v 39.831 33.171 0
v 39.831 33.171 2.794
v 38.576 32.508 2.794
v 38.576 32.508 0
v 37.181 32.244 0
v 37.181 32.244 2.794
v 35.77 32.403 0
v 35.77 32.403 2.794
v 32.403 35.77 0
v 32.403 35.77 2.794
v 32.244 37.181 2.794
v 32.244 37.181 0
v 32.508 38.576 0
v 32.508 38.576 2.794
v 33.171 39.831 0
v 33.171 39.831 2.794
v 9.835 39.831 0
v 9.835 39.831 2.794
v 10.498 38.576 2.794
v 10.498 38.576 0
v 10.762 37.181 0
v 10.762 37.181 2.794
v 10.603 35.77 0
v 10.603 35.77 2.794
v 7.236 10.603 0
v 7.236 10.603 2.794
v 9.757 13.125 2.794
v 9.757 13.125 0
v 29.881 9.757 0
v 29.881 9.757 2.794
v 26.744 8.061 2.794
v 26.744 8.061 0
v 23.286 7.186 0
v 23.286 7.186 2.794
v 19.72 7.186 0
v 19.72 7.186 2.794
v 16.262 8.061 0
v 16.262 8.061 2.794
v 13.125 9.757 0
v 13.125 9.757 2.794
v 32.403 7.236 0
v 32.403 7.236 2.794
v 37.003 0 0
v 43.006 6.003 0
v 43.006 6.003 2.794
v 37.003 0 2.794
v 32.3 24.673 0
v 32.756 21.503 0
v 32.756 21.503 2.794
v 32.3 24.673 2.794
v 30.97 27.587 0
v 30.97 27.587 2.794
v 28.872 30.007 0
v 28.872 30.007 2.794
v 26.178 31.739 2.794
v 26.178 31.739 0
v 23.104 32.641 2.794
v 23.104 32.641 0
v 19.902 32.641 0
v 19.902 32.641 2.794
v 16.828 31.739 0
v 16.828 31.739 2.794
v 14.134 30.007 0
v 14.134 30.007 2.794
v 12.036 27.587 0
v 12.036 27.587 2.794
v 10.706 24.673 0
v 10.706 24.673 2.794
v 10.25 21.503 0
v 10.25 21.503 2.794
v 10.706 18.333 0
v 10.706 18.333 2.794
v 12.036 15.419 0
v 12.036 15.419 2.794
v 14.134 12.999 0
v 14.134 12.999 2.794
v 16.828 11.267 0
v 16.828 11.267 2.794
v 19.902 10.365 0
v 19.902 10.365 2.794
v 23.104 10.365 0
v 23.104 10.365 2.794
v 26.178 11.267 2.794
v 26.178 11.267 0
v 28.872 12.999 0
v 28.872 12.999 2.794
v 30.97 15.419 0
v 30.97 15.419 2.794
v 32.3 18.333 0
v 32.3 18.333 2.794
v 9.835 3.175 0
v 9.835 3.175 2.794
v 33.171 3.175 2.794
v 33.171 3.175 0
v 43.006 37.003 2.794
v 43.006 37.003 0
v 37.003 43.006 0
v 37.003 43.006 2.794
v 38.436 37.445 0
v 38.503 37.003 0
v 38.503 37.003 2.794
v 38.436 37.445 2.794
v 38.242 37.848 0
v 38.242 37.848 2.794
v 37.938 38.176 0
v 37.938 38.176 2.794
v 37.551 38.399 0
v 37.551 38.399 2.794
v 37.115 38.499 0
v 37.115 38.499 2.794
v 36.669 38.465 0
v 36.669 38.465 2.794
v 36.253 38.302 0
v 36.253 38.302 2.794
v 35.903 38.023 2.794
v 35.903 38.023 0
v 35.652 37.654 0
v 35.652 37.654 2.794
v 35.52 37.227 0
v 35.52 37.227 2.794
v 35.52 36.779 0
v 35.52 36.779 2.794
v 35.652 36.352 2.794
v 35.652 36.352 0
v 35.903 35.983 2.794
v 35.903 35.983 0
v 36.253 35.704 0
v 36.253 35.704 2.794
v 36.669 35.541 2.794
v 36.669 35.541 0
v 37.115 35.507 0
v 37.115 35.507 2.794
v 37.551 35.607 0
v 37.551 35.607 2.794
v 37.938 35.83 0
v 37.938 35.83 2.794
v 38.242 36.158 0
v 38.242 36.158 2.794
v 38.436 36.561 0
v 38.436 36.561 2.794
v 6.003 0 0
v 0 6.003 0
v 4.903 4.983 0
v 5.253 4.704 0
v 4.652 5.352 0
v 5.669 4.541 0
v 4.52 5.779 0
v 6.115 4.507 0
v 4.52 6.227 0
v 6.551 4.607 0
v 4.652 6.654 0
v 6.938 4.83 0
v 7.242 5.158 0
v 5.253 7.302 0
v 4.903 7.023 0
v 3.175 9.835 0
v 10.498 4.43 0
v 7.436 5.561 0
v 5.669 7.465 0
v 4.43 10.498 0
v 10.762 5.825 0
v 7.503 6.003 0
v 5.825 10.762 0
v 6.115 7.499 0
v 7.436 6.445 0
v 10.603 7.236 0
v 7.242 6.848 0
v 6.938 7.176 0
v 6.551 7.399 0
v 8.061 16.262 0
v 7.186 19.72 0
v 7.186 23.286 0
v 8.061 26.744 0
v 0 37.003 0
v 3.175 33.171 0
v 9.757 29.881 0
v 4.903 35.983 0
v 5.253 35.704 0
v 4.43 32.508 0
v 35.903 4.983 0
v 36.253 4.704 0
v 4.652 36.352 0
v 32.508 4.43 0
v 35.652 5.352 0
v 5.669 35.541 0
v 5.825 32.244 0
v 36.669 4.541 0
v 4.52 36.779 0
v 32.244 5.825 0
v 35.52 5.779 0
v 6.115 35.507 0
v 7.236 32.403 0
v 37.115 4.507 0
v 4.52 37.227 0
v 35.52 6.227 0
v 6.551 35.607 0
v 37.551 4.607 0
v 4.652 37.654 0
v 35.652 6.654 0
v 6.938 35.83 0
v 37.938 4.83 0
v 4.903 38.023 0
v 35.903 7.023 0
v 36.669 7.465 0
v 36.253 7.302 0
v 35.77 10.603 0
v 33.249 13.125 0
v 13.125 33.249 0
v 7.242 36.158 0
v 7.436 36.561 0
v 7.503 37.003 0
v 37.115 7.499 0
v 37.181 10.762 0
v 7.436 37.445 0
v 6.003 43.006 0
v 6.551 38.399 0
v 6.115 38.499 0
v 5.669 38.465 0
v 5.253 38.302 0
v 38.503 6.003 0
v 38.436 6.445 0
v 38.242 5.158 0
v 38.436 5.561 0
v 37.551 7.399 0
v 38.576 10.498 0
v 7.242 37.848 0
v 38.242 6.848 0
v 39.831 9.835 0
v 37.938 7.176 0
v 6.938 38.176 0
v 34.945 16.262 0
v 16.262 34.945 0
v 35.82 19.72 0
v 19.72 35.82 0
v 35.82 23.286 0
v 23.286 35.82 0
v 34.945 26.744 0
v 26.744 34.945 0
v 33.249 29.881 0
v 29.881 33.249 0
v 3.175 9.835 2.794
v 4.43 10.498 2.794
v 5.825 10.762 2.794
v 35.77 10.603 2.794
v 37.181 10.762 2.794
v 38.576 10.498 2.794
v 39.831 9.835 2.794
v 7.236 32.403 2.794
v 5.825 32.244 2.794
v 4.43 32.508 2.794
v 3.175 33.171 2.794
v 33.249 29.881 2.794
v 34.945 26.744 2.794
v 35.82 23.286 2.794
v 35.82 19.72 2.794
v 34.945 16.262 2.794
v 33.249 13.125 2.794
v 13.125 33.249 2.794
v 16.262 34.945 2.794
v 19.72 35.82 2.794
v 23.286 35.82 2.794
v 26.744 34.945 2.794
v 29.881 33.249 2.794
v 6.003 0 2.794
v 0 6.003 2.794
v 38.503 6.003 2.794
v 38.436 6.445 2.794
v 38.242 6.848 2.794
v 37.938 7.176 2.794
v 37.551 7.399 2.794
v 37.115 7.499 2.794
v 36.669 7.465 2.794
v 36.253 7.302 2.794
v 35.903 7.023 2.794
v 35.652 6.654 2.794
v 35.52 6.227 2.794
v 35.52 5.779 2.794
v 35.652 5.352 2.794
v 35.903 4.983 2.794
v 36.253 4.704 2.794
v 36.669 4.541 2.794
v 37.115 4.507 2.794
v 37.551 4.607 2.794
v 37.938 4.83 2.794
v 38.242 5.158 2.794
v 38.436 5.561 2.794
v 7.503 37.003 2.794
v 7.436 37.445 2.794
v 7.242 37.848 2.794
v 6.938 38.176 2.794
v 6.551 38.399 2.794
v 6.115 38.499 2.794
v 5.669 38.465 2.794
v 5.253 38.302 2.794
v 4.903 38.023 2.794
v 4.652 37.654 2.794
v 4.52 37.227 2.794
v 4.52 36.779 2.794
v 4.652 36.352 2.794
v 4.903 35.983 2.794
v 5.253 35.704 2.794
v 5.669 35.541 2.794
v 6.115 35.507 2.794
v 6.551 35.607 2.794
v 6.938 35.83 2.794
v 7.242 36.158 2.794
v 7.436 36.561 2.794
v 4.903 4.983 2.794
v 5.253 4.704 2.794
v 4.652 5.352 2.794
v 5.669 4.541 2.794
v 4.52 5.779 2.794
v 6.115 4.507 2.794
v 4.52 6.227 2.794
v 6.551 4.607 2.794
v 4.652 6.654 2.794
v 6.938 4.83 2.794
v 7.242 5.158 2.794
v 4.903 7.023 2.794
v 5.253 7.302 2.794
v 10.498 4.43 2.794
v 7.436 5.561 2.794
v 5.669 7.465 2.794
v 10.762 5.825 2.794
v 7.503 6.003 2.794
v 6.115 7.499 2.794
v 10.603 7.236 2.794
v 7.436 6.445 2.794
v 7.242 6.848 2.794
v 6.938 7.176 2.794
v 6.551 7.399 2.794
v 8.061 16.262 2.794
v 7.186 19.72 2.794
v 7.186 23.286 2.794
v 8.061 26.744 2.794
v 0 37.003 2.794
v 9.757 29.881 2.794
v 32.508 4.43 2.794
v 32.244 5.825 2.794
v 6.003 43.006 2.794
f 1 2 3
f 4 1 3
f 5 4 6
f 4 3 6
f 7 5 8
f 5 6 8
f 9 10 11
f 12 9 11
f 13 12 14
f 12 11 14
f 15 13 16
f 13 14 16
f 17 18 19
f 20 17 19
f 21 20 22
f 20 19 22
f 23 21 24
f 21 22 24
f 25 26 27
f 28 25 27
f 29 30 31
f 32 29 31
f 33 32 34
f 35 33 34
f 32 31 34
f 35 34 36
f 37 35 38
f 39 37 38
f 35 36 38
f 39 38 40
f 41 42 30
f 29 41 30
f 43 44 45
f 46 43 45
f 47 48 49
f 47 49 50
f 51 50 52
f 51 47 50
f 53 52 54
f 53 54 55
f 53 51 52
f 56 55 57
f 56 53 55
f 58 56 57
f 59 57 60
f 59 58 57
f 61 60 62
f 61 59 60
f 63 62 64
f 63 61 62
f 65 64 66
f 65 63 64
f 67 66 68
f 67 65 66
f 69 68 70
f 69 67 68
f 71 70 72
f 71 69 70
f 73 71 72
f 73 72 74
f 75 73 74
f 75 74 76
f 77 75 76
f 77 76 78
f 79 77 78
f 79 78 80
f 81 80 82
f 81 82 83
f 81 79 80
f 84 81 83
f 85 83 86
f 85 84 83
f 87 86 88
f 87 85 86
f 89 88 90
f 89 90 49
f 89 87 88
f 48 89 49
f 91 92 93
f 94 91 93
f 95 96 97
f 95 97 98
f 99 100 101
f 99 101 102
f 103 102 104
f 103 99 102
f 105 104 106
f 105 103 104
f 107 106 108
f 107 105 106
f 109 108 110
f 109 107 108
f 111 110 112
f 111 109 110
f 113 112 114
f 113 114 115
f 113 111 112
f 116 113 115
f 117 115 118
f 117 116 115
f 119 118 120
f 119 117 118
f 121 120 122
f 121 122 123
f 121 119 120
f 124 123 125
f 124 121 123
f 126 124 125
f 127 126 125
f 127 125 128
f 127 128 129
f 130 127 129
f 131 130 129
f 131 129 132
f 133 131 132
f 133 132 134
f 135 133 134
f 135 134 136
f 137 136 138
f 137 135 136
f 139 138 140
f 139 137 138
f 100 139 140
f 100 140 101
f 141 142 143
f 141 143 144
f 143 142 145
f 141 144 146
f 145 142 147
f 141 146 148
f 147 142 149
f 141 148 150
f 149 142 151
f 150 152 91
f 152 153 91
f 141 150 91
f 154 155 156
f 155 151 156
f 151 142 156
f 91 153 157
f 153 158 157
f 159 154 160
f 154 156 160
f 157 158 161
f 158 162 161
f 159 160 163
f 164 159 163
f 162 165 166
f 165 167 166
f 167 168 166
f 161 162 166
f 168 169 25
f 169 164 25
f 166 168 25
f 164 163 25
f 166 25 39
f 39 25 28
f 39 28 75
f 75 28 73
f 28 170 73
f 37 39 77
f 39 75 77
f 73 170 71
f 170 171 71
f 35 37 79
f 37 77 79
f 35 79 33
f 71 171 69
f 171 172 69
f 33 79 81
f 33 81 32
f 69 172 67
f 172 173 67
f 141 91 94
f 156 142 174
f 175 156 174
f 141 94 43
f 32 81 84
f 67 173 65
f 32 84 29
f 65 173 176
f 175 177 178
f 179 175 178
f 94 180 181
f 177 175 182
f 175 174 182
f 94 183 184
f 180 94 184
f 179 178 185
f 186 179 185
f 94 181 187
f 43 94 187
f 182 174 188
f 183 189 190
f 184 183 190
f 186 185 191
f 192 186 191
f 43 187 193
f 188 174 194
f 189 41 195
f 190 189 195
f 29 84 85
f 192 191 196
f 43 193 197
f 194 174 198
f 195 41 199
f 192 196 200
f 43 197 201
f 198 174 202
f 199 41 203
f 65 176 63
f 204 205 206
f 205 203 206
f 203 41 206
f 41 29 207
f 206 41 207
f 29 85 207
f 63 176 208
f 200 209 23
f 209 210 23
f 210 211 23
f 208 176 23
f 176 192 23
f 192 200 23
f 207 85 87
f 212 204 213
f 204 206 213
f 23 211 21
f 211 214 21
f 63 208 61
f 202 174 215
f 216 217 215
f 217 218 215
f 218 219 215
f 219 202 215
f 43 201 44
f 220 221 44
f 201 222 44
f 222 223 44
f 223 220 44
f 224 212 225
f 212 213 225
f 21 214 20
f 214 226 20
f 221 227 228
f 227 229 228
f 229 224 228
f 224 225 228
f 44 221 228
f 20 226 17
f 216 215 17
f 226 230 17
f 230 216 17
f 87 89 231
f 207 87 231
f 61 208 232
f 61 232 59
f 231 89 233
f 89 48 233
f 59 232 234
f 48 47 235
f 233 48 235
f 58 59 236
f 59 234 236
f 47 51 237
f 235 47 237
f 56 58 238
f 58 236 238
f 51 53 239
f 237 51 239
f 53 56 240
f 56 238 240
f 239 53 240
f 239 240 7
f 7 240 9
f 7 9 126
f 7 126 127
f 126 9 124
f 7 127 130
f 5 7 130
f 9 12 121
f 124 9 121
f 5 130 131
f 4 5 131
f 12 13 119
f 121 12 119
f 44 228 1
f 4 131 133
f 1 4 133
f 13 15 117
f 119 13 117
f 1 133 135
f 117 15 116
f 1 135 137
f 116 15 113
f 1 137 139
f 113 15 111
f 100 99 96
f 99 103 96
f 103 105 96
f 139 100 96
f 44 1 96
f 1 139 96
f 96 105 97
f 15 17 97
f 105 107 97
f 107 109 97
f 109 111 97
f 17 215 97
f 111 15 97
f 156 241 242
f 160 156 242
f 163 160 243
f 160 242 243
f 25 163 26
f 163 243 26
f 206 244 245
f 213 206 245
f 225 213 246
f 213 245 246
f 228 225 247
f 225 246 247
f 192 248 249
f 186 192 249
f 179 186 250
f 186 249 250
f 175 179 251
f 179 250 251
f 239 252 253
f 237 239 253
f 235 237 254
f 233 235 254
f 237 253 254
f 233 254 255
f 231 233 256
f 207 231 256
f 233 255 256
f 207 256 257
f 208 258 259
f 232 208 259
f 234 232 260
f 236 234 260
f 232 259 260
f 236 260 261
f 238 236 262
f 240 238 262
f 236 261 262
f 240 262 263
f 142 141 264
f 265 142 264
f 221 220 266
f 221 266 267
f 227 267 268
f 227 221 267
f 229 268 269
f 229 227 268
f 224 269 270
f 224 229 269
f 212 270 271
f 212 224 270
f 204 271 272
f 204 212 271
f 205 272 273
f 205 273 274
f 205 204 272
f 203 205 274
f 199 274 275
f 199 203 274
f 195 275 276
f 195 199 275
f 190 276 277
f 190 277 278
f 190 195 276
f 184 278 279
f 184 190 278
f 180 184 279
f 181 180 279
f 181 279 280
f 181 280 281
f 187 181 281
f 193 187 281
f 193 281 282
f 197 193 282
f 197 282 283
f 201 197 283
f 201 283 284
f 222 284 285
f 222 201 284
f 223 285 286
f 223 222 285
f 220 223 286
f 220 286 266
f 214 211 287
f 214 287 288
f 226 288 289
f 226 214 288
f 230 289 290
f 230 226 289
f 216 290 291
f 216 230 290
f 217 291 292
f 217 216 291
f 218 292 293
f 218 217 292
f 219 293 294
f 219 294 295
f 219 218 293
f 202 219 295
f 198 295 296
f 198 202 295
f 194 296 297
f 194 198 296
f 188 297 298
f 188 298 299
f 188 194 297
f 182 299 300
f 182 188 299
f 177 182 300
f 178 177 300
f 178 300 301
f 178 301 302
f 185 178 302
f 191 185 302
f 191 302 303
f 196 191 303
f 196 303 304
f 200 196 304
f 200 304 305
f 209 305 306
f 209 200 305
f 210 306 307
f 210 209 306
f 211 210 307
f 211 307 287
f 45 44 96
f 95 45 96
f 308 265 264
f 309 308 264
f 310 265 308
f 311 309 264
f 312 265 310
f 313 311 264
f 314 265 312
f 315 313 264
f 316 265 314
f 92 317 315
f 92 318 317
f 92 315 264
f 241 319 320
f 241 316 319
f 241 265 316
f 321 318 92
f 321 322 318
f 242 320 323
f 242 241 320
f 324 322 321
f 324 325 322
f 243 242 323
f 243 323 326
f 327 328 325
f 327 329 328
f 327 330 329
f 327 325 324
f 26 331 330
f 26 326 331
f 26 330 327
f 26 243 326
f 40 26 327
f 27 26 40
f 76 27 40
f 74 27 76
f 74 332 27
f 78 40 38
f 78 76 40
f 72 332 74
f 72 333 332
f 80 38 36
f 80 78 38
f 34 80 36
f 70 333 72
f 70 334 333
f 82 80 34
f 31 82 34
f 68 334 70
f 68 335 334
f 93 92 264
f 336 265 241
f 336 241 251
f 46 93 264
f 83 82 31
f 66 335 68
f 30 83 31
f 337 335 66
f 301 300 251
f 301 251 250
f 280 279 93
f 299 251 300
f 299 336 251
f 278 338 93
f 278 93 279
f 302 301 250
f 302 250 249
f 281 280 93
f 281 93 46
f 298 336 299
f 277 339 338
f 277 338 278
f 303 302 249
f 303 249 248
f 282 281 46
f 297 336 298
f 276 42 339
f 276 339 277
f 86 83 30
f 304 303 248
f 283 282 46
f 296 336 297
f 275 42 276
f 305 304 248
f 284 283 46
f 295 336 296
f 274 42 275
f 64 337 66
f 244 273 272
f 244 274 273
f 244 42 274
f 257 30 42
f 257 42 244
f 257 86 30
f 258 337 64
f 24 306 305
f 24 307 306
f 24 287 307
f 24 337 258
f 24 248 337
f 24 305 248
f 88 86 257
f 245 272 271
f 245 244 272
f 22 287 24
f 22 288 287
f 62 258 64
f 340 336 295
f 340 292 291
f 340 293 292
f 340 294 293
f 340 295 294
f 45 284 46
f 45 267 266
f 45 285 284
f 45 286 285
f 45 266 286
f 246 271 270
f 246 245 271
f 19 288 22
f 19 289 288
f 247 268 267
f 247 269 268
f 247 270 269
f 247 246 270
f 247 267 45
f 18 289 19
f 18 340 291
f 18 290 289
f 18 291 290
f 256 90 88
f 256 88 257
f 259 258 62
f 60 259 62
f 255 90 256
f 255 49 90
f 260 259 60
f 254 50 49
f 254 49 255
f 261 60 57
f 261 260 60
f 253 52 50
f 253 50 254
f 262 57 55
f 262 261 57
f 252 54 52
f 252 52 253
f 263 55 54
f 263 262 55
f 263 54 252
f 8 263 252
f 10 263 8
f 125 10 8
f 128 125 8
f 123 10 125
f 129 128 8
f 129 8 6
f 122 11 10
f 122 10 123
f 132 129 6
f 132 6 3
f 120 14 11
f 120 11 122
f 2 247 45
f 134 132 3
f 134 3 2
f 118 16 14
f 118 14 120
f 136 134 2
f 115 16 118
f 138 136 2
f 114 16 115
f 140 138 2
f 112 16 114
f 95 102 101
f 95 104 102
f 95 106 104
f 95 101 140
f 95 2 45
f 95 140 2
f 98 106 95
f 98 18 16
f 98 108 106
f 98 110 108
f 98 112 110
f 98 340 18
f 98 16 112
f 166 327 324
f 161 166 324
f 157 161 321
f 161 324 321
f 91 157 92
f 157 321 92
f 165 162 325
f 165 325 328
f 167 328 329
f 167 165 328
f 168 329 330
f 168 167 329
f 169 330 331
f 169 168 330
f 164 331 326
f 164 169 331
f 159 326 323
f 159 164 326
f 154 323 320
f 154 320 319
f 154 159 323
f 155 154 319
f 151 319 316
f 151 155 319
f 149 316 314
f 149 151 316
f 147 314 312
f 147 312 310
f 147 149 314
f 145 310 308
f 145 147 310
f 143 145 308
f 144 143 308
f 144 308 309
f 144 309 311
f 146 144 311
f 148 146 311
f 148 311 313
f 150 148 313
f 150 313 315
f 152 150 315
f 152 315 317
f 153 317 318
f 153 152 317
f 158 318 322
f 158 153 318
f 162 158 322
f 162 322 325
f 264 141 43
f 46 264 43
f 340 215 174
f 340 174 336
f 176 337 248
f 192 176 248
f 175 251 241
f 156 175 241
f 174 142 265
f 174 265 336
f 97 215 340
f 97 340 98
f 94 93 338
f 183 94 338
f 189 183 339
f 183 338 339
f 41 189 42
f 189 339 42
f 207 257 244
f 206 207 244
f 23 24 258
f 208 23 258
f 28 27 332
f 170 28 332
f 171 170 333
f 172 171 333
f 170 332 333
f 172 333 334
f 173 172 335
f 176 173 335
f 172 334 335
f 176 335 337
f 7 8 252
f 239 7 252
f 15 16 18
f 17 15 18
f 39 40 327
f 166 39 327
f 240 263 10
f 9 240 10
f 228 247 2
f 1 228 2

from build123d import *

# Parameters (mm, degrees)
F0_W            = 43.0059846
F0_H            = 43.0059846
F0_R            = 1.5
F0_R_2          = 11.2530001
F1_DEPTH        = 2.79375108
F2_SIZE         = 6.0030106
F4_DEPTH        = 2.79375108
F4_COPIES_COUNT = 4


# Not quite as in the source:
# - a pattern or mirror of a feature is missing from the dataset's text; its kind, count and spacing are read off the source's solid


with BuildPart() as f1:
    # F0 (on Top) → F1 (new body)
    with BuildSketch(Plane.XY):
        with Locations((21.5029923, 21.5029923)):
            Rectangle(F0_W, F0_H)
        with Locations((6.0029979, 6.0029979)):
            Circle(F0_R, mode=Mode.SUBTRACT)
        with Locations((21.5029923, 21.5029923)):
            Circle(F0_R_2, mode=Mode.SUBTRACT)
        with Locations((37.0029867, 6.0029979)):
            Circle(F0_R, mode=Mode.SUBTRACT)
        with Locations((6.0029979, 37.0029867)):
            Circle(F0_R, mode=Mode.SUBTRACT)
        with Locations((37.0029867, 37.0029867)):
            Circle(F0_R, mode=Mode.SUBTRACT)
    extrude(amount=F1_DEPTH)

    # F2
    f2_edges = [f1.edges().sort_by_distance(p)[0] for p in [
        (0, 0, 1.396876),
        (0, 43.005985, 1.396876),
        (43.005985, 0, 1.396876),
        (43.005985, 43.005985, 1.396876),
    ]]
    chamfer(f2_edges, length=F2_SIZE)

    # F3 (on face) → F4 (cut, through all)
    with BuildSketch(Plane.XY.offset(2.79375108)):
        with BuildLine():
            ThreePointArc((7.2356236023, 32.4027649523), (5.1176370603, 32.3235056996), (3.175, 33.171037571))
            Line((3.175, 33.171037571), (3.175, 9.834947029))
            ThreePointArc((3.175, 9.834947029), (5.1176370603, 10.6824789004), (7.2356236023, 10.6032196477))
            Line((7.2356236023, 10.6032196477), (9.7569670059, 13.1245630513))
            ThreePointArc((9.7569670059, 13.1245630513), (7.0749922, 21.5029923), (9.7569670059, 29.8814215487))
            Line((9.7569670059, 29.8814215487), (7.2356236023, 32.4027649523))
        make_face()
    f4 = extrude(amount=-F4_DEPTH, mode=Mode.SUBTRACT)

    # F4_copies: F4 ×4 about axis
    f4_copies_axis = Axis((21.502992, 21.502992, 0), (0, 0, 1))
    for i in range(1, F4_COPIES_COUNT):
        add(f4.rotate(f4_copies_axis, i * 360 / F4_COPIES_COUNT), mode=Mode.SUBTRACT)


solid = f1.part
